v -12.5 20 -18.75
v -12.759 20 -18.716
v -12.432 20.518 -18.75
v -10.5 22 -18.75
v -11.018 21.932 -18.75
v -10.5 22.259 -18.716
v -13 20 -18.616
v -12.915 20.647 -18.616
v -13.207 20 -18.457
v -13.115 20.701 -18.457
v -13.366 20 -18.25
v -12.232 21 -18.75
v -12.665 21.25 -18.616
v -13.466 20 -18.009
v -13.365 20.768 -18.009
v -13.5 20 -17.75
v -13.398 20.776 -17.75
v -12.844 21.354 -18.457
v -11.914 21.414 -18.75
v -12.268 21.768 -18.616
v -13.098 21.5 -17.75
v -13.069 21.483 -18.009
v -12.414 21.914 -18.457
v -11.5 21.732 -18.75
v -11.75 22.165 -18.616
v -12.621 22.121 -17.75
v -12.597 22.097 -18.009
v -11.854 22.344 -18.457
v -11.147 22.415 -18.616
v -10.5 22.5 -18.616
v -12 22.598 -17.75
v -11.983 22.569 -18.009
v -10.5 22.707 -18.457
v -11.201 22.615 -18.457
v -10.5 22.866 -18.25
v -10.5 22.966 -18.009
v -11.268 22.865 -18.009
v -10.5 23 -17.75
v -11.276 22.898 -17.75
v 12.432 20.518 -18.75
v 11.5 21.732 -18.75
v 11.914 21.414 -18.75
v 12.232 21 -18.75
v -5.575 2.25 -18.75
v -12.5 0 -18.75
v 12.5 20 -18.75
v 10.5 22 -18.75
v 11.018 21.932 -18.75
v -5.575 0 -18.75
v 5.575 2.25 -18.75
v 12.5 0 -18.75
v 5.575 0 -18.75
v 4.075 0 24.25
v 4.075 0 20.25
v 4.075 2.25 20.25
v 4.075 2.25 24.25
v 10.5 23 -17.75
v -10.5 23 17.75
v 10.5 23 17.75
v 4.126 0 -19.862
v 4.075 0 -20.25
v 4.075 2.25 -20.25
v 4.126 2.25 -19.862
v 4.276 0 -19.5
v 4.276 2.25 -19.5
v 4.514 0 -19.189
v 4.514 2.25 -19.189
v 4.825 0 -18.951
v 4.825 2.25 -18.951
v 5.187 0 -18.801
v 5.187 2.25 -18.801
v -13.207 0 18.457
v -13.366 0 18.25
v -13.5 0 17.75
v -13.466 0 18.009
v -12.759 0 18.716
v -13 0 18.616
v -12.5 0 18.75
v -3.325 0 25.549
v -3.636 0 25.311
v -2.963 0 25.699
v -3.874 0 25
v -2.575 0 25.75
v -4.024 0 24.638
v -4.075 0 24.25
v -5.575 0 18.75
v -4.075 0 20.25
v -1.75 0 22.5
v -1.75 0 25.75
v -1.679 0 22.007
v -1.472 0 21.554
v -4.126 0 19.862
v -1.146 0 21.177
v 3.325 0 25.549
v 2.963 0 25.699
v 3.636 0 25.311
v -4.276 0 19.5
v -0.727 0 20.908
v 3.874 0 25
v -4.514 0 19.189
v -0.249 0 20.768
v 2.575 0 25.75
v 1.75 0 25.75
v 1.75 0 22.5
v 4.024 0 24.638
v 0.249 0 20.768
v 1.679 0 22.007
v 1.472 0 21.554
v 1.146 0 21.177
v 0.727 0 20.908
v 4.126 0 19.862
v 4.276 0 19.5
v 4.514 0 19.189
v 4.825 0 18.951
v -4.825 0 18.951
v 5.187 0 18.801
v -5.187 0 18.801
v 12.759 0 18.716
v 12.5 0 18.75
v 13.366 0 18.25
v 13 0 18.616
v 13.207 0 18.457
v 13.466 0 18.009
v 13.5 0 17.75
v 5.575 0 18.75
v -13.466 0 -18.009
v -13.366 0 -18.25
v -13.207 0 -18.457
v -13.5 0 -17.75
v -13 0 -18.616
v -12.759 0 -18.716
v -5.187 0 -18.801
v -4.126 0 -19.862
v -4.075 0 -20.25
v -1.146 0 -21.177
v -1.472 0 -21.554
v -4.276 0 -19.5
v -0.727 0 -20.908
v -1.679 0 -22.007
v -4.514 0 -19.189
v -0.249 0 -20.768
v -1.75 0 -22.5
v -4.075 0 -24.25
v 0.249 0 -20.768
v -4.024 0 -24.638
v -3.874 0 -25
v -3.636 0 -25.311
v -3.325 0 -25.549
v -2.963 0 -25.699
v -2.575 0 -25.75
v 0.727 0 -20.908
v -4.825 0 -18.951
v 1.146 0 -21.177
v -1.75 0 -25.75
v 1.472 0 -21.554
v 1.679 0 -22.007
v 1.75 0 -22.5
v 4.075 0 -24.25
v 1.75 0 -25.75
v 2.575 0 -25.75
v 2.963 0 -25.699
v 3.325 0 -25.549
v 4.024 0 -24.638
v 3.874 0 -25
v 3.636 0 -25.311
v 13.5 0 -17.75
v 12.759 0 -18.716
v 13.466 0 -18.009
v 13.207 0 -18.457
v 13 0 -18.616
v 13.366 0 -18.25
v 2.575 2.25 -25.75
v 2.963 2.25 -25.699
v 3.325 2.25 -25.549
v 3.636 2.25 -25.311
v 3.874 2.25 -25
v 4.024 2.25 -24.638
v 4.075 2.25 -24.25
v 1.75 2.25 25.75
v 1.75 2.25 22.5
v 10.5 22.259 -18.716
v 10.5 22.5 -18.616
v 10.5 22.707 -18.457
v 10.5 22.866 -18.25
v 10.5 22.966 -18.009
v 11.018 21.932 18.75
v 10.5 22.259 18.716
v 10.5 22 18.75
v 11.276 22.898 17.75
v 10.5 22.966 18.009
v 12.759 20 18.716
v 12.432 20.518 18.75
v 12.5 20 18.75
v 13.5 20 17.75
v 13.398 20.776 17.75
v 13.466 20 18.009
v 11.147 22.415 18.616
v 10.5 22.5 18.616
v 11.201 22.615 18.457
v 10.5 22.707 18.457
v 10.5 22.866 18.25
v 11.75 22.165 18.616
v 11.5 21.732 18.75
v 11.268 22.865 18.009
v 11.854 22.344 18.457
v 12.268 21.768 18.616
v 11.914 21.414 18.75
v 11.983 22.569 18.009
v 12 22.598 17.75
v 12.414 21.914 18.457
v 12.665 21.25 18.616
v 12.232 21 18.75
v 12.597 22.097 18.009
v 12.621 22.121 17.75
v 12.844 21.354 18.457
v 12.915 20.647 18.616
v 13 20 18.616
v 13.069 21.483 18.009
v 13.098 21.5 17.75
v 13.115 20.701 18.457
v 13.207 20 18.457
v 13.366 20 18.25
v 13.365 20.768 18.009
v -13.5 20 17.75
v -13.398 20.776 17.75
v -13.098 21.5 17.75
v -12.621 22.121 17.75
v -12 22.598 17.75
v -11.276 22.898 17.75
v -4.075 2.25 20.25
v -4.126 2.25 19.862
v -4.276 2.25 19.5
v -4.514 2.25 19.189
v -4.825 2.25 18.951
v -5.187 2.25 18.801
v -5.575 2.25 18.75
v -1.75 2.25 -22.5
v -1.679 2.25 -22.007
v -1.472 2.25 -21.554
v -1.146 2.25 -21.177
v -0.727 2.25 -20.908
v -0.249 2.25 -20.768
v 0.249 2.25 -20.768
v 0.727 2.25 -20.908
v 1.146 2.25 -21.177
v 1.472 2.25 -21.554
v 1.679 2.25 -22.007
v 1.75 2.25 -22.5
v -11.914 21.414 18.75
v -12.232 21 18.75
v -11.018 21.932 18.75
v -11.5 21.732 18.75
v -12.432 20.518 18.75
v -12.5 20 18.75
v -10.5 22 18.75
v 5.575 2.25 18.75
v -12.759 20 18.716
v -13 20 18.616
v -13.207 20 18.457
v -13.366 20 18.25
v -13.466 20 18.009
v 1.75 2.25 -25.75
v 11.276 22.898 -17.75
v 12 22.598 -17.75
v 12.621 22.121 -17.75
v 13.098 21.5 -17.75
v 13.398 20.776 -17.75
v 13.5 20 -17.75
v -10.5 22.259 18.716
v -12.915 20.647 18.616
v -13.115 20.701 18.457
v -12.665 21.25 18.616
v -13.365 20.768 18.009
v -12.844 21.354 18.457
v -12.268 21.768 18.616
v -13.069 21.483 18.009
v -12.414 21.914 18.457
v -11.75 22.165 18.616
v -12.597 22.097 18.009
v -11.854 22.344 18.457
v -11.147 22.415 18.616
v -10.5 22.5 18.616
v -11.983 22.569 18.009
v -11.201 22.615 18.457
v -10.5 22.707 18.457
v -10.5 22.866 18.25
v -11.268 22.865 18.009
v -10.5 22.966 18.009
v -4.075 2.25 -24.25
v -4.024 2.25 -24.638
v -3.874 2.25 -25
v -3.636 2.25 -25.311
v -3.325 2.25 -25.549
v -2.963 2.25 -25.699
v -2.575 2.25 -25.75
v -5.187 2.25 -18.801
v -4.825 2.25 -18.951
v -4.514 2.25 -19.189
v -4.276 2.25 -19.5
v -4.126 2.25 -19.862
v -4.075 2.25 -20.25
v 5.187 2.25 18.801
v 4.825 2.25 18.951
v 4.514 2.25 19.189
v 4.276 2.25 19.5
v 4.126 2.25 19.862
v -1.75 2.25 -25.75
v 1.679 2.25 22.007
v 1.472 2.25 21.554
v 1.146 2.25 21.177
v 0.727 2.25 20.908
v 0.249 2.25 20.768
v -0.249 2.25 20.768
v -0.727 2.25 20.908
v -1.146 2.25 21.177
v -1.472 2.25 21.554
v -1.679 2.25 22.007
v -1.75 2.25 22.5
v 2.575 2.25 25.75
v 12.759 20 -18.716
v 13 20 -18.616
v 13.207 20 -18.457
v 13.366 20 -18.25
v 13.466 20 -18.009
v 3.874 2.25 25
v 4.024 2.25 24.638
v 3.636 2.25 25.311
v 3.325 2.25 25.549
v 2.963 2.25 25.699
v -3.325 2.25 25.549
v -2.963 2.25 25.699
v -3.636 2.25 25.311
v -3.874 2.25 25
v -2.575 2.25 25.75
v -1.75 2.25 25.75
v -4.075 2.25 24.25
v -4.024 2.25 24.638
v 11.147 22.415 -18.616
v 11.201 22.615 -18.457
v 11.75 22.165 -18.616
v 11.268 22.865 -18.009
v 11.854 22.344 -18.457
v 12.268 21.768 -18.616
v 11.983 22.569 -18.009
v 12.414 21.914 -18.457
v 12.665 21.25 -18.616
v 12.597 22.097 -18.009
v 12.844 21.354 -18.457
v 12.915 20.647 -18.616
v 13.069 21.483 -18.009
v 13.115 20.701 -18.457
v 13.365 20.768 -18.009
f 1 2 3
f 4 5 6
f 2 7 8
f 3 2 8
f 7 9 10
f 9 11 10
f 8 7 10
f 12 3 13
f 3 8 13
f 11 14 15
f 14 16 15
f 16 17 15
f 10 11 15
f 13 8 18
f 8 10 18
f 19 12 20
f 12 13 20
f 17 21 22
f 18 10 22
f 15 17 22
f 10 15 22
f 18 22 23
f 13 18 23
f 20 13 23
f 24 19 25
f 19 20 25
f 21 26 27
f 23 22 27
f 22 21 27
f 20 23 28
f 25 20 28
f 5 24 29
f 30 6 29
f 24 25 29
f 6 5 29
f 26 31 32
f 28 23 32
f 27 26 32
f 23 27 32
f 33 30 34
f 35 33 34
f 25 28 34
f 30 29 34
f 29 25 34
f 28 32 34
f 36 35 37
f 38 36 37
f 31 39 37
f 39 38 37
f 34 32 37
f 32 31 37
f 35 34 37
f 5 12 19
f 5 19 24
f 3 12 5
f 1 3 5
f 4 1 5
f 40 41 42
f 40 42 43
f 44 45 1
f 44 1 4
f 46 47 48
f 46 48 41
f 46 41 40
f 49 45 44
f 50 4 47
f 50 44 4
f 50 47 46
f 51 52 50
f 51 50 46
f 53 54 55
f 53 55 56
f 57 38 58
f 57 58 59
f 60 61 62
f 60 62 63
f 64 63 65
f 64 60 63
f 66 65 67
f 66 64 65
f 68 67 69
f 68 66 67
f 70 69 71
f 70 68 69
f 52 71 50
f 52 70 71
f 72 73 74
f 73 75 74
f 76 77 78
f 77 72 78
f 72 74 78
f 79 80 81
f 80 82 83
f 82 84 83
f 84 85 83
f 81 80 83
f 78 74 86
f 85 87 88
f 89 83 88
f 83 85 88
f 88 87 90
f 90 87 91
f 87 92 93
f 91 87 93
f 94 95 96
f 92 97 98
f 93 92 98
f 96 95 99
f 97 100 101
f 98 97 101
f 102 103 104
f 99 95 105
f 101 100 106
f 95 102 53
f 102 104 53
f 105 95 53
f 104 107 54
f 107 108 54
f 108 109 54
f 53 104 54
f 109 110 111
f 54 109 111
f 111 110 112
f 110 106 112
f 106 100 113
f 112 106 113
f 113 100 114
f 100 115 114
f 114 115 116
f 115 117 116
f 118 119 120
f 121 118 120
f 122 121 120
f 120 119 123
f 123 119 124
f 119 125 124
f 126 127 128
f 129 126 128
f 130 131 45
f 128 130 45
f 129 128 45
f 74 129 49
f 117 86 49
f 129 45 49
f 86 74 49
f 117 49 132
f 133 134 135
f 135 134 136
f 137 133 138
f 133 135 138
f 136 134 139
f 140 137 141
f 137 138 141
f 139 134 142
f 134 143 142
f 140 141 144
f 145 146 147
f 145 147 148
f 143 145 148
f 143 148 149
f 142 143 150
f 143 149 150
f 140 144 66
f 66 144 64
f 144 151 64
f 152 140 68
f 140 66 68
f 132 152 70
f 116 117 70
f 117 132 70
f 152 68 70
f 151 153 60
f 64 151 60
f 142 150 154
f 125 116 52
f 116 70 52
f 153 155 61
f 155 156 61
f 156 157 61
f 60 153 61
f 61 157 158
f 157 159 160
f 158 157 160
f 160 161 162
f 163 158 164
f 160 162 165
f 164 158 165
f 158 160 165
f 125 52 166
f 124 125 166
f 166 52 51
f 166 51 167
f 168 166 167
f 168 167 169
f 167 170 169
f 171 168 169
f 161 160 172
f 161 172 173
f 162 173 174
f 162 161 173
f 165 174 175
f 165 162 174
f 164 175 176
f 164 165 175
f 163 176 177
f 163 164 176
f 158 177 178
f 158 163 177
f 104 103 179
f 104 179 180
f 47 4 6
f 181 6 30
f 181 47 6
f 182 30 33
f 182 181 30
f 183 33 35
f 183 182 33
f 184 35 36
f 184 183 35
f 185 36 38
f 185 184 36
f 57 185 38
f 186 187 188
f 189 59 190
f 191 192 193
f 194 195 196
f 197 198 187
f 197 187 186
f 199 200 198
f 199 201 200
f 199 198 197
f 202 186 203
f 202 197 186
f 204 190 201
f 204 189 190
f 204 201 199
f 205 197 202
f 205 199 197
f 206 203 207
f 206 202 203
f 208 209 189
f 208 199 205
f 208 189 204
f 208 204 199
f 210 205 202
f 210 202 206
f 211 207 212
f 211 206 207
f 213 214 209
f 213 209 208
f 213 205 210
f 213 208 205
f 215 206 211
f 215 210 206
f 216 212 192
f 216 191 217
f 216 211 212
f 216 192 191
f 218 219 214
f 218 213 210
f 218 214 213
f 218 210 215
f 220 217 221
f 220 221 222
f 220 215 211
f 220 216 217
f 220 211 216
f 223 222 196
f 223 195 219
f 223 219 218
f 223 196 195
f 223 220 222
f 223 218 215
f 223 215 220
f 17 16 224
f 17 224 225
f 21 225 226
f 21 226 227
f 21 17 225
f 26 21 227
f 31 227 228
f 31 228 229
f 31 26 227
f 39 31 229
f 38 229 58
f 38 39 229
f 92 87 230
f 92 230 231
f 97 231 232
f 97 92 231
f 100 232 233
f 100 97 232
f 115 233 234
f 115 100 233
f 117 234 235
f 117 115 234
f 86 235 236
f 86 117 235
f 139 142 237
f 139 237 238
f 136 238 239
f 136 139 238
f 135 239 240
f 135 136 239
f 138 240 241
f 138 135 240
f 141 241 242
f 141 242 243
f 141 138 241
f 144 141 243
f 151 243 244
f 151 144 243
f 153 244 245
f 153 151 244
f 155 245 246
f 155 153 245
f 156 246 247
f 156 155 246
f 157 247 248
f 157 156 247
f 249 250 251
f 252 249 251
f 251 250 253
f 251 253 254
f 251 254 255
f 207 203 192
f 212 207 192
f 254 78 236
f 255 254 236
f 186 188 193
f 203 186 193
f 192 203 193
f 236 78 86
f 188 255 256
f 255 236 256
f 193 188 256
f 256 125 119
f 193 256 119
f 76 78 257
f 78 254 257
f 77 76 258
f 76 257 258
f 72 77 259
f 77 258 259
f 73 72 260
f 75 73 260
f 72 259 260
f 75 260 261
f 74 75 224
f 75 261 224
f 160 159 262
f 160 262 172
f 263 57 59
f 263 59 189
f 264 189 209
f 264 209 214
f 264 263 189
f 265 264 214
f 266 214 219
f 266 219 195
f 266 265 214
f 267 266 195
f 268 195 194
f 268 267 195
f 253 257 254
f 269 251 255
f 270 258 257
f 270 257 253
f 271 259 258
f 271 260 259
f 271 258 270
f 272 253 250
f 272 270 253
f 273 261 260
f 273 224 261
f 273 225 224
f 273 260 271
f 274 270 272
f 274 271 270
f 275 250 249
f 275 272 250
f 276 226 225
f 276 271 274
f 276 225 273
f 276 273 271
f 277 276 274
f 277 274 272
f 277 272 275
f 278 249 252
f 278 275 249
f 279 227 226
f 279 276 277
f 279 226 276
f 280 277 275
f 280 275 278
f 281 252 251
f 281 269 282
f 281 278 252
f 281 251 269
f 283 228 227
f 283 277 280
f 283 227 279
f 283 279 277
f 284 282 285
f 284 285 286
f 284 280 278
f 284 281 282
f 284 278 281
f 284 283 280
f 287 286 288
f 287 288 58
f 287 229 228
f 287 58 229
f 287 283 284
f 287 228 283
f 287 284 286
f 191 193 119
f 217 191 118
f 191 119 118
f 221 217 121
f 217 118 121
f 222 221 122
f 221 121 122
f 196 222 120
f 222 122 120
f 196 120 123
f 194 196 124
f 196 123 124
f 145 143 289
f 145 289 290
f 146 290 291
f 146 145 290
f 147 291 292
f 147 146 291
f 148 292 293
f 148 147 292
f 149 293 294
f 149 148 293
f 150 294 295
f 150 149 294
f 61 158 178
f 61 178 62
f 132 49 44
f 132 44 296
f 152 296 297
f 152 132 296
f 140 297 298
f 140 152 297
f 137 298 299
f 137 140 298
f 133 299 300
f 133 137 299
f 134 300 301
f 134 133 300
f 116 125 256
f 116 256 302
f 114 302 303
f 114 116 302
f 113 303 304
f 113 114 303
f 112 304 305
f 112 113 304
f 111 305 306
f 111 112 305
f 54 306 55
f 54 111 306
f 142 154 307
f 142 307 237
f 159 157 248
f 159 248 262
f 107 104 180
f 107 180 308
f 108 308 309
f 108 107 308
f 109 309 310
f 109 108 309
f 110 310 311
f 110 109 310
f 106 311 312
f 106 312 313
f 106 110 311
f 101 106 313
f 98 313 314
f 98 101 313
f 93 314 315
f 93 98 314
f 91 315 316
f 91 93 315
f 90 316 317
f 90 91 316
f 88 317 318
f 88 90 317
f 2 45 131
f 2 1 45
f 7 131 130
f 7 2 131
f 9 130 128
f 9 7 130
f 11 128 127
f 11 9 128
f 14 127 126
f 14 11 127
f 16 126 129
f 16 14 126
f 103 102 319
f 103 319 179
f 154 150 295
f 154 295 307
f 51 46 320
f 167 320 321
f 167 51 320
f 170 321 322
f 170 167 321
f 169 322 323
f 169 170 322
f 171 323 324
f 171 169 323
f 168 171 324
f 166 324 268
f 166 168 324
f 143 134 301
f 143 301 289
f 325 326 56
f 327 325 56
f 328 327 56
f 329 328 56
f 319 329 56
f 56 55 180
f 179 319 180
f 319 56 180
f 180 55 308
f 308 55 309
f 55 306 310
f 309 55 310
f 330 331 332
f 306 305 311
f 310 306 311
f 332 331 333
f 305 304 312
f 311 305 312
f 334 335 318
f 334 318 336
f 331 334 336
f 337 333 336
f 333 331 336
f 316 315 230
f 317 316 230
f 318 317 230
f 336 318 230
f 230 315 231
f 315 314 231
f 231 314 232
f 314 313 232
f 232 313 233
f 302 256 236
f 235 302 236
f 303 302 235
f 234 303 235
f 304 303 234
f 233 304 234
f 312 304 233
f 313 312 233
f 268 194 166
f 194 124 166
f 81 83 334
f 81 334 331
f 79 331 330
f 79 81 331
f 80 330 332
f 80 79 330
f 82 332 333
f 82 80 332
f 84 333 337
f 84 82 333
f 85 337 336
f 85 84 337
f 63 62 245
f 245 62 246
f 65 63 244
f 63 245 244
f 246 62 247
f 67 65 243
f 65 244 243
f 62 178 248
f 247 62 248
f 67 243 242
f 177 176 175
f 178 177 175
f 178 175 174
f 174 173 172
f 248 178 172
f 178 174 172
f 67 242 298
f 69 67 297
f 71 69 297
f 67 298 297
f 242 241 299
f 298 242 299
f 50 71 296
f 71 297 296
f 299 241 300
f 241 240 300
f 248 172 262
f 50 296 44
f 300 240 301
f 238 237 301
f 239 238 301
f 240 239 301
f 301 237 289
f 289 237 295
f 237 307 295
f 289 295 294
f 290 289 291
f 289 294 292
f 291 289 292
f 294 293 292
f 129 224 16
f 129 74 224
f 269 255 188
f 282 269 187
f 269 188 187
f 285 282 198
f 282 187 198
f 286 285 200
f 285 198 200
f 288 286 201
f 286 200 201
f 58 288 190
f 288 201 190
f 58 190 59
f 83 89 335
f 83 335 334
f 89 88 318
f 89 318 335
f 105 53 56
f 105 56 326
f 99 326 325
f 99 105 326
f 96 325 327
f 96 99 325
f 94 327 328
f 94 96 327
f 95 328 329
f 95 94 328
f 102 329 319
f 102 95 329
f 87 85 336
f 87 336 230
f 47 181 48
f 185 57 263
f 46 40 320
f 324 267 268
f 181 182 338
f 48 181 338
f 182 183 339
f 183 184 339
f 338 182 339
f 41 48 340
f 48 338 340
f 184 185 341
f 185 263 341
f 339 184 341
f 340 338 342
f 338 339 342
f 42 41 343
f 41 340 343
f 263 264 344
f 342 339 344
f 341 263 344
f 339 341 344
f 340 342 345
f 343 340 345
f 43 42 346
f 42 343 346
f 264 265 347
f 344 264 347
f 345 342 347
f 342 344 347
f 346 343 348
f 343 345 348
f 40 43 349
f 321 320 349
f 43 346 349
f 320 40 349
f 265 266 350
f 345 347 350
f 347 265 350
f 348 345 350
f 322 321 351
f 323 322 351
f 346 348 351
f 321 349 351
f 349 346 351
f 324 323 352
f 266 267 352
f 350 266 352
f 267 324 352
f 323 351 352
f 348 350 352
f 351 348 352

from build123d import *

# Parameters (mm, degrees)
SKETCH1_W           = 27
SKETCH1_H           = 37.5
BOSS_EXTRUDE1_DEPTH = 23
BOSS_EXTRUDE2_DEPTH = 2.25
FILLET1_R           = 3
FILLET2_R           = 1


with BuildPart() as part:
    # Sketch1 → Boss-Extrude1 (new body)
    with BuildSketch(Plane(origin=(0, 0, 0), x_dir=(1, 0, 0), z_dir=(0, 1, 0))):
        Rectangle(SKETCH1_W, SKETCH1_H)
    extrude(amount=BOSS_EXTRUDE1_DEPTH)

    # Sketch2 → Boss-Extrude2 (add)
    with BuildSketch(Plane(origin=(0, 0, 0), x_dir=(1, 0, 0), z_dir=(0, 1, 0))):
        with BuildLine():
            Line((-1.75, -22.5), (-1.75, -25.75))
            Line((-1.75, -25.75), (-2.575, -25.75))
            ThreePointArc((-2.575, -25.75), (-3.635660172, -25.310660172), (-4.075, -24.25))
            Line((-4.075, -24.25), (-4.075, -20.25))
            ThreePointArc((-4.075, -20.25), (-4.514339828, -19.189339828), (-5.575, -18.75))
            Line((-5.575, -18.75), (5.575, -18.75))
            ThreePointArc((5.575, -18.75), (4.514339828, -19.189339828), (4.075, -20.25))
            Line((4.075, -20.25), (4.075, -24.25))
            ThreePointArc((4.075, -24.25), (3.635660172, -25.310660172), (2.575, -25.75))
            Line((2.575, -25.75), (1.75, -25.75))
            Line((1.75, -25.75), (1.75, -22.5))
            ThreePointArc((1.75, -22.5), (0, -20.75), (-1.75, -22.5))
        make_face()
        with BuildLine():
            Line((1.75, 22.5), (1.75, 25.75))
            Line((1.75, 25.75), (2.575, 25.75))
            ThreePointArc((2.575, 25.75), (3.635660172, 25.310660172), (4.075, 24.25))
            Line((4.075, 24.25), (4.075, 20.25))
            ThreePointArc((4.075, 20.25), (4.514339828, 19.189339828), (5.575, 18.75))
            Line((5.575, 18.75), (-5.575, 18.75))
            ThreePointArc((-5.575, 18.75), (-4.514339828, 19.189339828), (-4.075, 20.25))
            Line((-4.075, 20.25), (-4.075, 24.25))
            ThreePointArc((-4.075, 24.25), (-3.635660172, 25.310660172), (-2.575, 25.75))
            Line((-2.575, 25.75), (-1.75, 25.75))
            Line((-1.75, 25.75), (-1.75, 22.5))
            ThreePointArc((-1.75, 22.5), (0, 20.75), (1.75, 22.5))
        make_face()
    extrude(amount=BOSS_EXTRUDE2_DEPTH)

    # Fillet1
    fillet1_edges = [part.edges().sort_by_distance(p)[0] for p in [
        (13.5, 23, 0),
        (-13.5, 23, 0),
    ]]
    fillet(fillet1_edges, radius=FILLET1_R)

    # Fillet2
    fillet2_edges = [part.edges().sort_by_distance(p)[0] for p in [
        (0, 23, 18.75),
        (0, 23, -18.75),
        (-13.5, 10, -18.75),
        (13.5, 10, -18.75),
        (-12.621320344, 22.121320344, -18.75),
        (12.621320344, 22.121320344, -18.75),
        (13.5, 10, 18.75),
        (-13.5, 10, 18.75),
        (-12.621320344, 22.121320344, 18.75),
        (12.621320344, 22.121320344, 18.75),
    ]]
    fillet(fillet2_edges, radius=FILLET2_R)


solid = part.part
